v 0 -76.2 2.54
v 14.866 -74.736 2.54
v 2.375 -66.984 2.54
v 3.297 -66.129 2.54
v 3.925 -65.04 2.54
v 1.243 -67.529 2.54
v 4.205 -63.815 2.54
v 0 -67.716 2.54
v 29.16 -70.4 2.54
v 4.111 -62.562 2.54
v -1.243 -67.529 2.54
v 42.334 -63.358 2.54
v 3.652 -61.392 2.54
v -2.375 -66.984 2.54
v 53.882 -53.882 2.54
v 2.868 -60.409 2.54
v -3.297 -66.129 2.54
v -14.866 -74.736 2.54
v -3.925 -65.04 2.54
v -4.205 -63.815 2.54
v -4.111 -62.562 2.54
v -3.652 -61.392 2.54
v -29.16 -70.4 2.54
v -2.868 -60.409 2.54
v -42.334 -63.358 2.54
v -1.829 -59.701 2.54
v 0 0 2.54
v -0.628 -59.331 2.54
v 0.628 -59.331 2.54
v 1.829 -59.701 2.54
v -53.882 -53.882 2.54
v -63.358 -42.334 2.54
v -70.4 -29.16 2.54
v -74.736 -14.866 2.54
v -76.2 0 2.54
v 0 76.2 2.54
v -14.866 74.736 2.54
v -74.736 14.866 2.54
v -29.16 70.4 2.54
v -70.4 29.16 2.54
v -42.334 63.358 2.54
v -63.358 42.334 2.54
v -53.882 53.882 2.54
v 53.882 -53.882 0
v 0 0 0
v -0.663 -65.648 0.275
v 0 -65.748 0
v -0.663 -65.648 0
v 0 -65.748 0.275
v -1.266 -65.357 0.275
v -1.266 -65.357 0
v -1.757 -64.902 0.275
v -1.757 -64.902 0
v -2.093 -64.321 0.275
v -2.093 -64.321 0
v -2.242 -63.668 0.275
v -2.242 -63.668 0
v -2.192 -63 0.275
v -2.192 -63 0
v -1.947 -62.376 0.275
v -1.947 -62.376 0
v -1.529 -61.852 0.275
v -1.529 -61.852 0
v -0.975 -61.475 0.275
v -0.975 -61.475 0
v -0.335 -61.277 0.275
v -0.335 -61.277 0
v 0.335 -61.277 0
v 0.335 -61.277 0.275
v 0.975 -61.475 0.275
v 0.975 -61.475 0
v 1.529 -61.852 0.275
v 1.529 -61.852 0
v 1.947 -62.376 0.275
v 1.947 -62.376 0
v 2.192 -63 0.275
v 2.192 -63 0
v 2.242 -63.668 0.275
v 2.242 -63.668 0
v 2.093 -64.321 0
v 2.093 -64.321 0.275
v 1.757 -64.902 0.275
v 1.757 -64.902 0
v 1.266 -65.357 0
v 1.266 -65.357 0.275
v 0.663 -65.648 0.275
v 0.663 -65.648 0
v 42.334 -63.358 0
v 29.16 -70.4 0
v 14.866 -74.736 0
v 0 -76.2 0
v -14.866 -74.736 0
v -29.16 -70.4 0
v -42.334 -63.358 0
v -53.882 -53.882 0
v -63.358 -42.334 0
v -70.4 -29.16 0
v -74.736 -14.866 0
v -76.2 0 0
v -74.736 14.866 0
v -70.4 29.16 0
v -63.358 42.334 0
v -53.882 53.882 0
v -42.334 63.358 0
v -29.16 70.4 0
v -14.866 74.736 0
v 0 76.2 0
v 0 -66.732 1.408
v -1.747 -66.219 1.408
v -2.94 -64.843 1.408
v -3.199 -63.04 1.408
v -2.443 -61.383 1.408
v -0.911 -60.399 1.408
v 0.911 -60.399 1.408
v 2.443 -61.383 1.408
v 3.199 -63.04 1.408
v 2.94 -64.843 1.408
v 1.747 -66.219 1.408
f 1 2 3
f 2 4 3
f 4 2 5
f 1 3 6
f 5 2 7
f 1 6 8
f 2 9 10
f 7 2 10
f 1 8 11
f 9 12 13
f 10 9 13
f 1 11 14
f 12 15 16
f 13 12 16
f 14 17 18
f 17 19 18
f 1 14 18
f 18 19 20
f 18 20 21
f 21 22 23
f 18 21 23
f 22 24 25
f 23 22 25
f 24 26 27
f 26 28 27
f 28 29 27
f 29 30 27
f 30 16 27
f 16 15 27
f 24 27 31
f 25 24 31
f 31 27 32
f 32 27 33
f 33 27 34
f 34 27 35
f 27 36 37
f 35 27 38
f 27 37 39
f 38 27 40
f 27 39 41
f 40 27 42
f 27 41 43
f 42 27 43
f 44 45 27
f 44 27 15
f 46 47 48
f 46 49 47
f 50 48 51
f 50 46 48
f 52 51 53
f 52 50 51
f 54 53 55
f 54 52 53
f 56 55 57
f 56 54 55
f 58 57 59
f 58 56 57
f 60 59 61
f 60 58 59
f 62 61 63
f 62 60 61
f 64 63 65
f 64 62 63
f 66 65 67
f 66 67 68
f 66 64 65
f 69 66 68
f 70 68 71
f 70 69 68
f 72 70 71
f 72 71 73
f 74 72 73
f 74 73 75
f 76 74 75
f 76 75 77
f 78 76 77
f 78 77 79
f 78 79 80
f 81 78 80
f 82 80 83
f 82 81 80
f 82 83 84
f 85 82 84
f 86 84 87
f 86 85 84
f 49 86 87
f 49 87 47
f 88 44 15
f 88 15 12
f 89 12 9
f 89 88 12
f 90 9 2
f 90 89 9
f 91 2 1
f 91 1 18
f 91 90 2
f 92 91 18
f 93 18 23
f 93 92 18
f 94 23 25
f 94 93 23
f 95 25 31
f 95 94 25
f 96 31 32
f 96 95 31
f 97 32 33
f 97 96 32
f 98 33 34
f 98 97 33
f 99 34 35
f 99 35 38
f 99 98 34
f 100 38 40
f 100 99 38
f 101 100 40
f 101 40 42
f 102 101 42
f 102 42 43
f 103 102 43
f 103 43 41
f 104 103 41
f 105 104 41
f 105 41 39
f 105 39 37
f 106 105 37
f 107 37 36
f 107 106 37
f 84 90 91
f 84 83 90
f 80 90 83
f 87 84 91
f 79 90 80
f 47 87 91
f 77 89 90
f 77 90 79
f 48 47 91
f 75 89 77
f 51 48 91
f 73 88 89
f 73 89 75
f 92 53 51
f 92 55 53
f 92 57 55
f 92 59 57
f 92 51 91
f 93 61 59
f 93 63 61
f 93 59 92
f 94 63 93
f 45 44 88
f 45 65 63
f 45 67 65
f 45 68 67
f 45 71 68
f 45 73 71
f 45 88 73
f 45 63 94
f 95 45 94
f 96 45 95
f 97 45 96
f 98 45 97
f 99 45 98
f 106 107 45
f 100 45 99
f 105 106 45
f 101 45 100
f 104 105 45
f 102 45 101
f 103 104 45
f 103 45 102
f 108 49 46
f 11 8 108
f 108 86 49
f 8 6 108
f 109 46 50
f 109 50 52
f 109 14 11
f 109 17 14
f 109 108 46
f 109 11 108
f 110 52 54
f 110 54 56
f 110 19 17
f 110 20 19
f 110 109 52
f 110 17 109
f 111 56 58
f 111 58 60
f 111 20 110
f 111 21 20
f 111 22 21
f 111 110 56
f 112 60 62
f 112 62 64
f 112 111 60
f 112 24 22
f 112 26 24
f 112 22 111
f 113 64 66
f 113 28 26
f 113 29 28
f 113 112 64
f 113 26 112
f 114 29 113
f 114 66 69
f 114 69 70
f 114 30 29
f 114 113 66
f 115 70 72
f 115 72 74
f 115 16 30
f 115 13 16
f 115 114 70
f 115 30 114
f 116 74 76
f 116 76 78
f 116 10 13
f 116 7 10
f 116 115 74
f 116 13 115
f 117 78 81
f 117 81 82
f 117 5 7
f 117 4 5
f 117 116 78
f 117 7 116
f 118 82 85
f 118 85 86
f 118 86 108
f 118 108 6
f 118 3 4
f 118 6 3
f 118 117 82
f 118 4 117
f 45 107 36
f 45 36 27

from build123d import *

# Parameters (mm, degrees)
BOSS_EXTRUDE1_DEPTH = 2.54


with BuildPart() as part:
    # Sketch1 → Boss-Extrude1 (new body)
    with BuildSketch(Plane.XY):
        with BuildLine():
            Line((0, 0), (53.881536726, -53.881536726))
            ThreePointArc((53.881536726, -53.881536726), (-70.399620377, -29.160477546), (0, 76.2))
            Line((0, 76.2), (0, 0))
        make_face()
    extrude(amount=BOSS_EXTRUDE1_DEPTH)

    # Sketch3 → CSK for #8 Flat Head Machine Screw1 (revolve, cut)
    with BuildSketch(Plane(origin=(0, -63.5, 2.54), x_dir=(0, -1, 0), z_dir=(1, 0, 0))):
        Polygon((0, 0), (0, 2.54), (2.2479, 2.54), (2.2479, 2.26450021), (4.2164, 0), align=None)
    revolve(axis=Axis((0, -63.5, 8.89), (0, 0, -1)), mode=Mode.SUBTRACT)


solid = part.part
